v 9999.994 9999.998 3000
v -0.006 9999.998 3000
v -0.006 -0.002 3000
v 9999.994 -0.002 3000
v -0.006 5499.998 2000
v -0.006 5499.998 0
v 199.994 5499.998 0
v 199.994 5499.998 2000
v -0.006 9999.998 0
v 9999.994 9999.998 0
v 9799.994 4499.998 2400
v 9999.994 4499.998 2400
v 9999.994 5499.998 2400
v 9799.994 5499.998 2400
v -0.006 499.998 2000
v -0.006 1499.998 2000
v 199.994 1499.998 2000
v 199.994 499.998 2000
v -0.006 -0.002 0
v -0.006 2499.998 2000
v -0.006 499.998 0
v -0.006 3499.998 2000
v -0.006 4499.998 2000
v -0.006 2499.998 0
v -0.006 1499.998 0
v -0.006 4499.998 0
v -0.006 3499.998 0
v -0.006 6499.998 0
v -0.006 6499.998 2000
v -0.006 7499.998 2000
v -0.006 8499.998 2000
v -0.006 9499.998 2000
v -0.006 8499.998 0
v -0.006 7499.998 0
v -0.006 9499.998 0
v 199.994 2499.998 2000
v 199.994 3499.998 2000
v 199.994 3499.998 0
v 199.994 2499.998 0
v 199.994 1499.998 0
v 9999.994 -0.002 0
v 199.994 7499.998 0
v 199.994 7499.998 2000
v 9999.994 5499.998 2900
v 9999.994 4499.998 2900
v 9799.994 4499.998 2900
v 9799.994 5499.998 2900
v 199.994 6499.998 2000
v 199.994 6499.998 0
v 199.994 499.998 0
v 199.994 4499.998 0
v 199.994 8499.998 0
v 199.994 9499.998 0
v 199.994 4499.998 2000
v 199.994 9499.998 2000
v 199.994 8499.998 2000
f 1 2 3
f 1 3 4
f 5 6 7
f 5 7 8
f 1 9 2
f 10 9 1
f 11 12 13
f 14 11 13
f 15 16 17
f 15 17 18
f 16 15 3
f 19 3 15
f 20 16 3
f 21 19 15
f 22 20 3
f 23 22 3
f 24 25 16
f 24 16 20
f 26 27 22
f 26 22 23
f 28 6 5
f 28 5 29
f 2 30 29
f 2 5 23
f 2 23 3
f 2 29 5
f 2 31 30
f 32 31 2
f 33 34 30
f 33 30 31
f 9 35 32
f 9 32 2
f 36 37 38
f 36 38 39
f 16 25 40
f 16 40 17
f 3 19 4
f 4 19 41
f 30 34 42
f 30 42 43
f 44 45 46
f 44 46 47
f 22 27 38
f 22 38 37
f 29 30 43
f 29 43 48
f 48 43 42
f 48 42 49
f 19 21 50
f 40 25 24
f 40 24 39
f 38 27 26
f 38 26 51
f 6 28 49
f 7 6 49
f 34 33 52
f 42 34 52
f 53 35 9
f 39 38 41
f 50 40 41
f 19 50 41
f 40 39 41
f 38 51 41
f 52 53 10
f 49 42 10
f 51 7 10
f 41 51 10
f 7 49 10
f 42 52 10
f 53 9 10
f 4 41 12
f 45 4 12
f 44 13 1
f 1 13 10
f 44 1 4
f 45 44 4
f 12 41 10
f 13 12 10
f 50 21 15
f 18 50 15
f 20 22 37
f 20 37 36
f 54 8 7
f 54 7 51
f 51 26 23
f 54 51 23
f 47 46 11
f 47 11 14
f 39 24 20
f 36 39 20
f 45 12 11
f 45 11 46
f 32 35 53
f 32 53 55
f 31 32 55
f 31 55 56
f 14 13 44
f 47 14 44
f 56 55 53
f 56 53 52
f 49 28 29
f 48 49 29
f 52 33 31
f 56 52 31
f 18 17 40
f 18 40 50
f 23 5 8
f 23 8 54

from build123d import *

# Parameters (mm, degrees)
F0_W     = 10000
F0_H     = 10000
F1_DEPTH = 3000
F2_W     = 1000
F2_H     = 2000
F3_DEPTH = 200
F4_W     = 1000
F4_H     = 500
F5_DEPTH = 200


with BuildPart() as f1:
    # F0 (on Top) → F1 (new body)
    with BuildSketch(Plane.XY):
        with Locations((4999.994307, 4999.998281)):
            Rectangle(F0_W, F0_H)
    extrude(amount=F1_DEPTH)

    # F2 (on face) → F3 (cut)
    with BuildSketch(Plane(origin=(-0.005693, 0, 0), x_dir=(0, -1, 0), z_dir=(-1, 0, 0))):
        with Locations((-8999.998281, 1000)):
            Rectangle(F2_W, F2_H)
        with Locations((-6999.998281, 1000)):
            Rectangle(F2_W, F2_H)
        with Locations((-4999.998281, 1000)):
            Rectangle(F2_W, F2_H)
        with Locations((-2999.998281, 1000)):
            Rectangle(F2_W, F2_H)
        with Locations((-999.998281, 1000)):
            Rectangle(F2_W, F2_H)
    extrude(amount=-F3_DEPTH, mode=Mode.SUBTRACT)

    # F4 (on face) → F5 (cut)
    with BuildSketch(Plane.YZ.offset(9999.994307)):
        with Locations((4999.998281, 2650)):
            Rectangle(F4_W, F4_H)
    extrude(amount=-F5_DEPTH, mode=Mode.SUBTRACT)


solid = f1.part
